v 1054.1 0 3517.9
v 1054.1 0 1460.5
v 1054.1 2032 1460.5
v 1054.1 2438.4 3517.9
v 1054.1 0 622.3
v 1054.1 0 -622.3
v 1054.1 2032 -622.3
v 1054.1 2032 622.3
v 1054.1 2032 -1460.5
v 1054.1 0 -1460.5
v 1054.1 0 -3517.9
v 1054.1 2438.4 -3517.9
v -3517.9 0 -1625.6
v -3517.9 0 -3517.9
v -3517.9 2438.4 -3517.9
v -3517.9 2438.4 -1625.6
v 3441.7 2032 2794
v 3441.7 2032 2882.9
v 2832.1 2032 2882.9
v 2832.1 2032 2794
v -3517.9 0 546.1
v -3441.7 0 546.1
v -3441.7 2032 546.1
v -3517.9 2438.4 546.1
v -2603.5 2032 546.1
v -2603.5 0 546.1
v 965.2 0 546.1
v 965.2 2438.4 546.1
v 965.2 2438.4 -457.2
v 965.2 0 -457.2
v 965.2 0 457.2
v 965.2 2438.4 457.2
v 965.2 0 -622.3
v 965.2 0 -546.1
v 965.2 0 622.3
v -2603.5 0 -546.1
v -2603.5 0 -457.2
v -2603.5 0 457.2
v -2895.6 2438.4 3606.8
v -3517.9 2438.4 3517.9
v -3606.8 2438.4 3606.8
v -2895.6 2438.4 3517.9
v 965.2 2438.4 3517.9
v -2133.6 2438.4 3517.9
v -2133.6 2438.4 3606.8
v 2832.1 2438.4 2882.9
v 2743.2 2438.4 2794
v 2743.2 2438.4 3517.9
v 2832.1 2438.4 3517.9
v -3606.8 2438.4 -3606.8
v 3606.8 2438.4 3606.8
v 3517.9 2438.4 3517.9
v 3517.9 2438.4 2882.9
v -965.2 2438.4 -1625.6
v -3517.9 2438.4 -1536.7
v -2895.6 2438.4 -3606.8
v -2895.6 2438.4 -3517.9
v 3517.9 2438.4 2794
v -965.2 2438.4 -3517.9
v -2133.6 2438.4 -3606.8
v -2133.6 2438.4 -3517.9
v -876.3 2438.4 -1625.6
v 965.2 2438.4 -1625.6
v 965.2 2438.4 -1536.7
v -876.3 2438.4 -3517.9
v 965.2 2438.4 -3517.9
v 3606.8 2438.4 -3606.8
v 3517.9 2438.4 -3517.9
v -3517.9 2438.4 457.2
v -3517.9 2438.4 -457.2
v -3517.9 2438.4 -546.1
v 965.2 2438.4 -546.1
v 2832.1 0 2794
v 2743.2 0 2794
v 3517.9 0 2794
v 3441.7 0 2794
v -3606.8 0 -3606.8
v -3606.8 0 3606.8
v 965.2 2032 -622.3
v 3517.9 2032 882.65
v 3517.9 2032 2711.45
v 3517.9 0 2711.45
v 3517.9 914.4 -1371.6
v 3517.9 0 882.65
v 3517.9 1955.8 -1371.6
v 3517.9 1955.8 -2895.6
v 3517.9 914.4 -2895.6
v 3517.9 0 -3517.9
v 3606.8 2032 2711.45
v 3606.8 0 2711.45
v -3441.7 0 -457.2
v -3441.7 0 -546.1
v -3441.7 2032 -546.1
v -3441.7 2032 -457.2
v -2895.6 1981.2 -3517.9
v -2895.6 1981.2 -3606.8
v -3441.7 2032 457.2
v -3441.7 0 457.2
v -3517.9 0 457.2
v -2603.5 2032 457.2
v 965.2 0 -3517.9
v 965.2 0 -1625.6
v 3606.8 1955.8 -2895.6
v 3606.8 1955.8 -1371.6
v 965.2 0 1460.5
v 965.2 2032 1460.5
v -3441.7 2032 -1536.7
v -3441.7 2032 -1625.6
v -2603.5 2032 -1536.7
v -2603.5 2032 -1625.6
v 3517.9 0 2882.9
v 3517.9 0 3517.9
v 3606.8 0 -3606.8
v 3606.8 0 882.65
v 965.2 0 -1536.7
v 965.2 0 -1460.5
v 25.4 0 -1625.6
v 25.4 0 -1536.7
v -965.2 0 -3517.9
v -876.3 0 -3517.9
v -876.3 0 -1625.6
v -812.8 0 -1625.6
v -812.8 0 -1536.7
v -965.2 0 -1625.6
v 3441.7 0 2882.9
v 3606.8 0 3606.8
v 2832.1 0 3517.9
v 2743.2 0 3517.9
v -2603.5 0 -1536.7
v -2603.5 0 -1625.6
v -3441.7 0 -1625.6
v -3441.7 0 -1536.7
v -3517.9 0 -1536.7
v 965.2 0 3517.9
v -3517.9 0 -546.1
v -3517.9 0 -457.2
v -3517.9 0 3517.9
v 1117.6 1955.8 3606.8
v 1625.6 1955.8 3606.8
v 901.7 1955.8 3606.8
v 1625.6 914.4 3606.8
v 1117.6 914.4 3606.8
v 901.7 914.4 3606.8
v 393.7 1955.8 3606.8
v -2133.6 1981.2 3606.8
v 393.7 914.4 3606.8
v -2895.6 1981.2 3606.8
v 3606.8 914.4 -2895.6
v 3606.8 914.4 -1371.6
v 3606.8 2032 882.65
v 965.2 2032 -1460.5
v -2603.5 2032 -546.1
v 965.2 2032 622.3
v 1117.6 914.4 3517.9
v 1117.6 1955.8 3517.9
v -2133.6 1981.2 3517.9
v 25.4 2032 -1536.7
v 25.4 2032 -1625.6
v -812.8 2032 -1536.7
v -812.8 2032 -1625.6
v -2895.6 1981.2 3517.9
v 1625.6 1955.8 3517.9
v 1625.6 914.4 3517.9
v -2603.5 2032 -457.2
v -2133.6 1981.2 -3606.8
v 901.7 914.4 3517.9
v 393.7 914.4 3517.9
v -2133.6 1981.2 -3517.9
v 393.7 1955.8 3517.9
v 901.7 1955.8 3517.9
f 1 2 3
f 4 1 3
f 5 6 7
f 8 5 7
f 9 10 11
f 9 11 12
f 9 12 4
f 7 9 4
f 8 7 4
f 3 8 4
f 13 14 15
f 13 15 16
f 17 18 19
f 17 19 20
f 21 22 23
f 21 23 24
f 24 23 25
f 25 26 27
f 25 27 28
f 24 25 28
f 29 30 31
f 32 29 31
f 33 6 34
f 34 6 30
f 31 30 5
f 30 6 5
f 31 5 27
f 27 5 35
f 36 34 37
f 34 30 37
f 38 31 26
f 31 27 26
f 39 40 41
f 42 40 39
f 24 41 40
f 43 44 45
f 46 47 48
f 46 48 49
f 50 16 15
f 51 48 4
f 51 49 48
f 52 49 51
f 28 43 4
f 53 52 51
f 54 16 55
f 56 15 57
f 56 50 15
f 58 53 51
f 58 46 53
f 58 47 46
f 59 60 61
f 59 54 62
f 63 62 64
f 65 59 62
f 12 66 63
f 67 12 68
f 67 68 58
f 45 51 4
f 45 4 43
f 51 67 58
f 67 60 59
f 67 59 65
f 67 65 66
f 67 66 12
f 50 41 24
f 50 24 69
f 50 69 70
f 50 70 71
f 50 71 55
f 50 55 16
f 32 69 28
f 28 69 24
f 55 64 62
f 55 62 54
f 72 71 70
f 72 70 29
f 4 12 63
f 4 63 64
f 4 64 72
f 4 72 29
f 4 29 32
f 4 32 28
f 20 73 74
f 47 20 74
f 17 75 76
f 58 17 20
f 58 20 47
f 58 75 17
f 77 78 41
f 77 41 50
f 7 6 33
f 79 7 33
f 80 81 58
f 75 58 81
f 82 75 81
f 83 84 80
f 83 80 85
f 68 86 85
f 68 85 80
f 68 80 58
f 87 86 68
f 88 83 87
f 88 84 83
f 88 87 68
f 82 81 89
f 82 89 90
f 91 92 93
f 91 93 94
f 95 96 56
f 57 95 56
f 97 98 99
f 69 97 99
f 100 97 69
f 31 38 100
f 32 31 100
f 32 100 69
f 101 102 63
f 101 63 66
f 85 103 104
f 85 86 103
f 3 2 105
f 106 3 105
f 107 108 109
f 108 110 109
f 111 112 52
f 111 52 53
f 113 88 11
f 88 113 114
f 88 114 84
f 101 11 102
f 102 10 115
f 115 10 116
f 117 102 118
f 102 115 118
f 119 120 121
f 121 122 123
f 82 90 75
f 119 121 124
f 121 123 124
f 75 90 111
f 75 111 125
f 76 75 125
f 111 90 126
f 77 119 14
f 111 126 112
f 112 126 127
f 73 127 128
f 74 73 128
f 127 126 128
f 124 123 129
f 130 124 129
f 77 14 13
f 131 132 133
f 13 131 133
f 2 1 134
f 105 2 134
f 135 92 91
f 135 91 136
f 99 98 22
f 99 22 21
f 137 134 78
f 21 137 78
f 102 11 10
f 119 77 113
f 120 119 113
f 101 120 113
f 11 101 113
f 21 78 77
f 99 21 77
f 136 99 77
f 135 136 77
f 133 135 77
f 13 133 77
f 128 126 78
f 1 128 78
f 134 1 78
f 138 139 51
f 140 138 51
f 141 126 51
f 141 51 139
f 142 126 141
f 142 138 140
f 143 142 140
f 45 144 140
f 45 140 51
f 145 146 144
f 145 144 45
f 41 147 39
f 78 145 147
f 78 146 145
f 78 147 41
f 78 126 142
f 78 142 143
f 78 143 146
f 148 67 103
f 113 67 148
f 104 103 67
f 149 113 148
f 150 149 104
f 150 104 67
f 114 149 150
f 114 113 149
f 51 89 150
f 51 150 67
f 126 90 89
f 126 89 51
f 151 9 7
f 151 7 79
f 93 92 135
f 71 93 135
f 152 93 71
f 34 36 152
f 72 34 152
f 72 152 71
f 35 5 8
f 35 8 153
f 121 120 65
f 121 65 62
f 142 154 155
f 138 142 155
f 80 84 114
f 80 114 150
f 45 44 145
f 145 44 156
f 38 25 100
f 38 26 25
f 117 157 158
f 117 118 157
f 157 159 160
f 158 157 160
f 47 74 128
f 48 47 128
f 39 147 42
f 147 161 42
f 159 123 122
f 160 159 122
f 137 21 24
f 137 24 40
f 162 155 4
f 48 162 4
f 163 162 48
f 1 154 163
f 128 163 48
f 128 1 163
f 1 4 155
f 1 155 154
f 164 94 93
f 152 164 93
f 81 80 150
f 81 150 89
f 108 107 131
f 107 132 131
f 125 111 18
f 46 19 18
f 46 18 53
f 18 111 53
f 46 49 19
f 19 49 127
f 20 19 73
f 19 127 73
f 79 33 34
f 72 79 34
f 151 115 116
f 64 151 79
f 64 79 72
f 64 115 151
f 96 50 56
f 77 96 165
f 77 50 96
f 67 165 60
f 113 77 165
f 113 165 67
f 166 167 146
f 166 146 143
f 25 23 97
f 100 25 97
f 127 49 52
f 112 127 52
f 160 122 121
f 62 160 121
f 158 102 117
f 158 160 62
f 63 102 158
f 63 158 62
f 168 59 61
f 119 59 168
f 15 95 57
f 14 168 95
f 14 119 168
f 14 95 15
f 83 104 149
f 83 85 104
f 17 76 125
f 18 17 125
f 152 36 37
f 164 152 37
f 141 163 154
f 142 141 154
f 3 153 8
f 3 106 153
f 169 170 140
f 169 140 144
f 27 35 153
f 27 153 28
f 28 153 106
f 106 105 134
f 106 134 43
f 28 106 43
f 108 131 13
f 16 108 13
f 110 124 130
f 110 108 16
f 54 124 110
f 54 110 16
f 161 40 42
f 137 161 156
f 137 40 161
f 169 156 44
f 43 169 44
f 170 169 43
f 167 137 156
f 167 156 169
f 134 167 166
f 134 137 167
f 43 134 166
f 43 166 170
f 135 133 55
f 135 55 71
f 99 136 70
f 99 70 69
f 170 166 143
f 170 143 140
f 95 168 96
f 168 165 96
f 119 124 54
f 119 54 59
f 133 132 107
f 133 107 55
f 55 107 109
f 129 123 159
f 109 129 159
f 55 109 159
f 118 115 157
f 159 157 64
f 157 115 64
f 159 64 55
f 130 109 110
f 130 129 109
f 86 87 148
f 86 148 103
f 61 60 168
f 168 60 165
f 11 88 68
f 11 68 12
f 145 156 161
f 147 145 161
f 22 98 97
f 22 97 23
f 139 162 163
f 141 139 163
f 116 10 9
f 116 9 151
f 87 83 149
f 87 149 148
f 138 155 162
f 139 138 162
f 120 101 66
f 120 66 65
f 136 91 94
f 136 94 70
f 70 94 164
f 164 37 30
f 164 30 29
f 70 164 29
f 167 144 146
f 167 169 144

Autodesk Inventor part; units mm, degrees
ref_plane "YZ Plane" through (0, 0, 0) normal (1, 0, 0) x (0, 1, 0)
ref_plane "XZ Plane" through (0, 0, 0) normal (0, 1, 0) x (-1, 0, 0)
ref_plane "XY Plane" through (0, 0, 0) normal (0, 0, 1) x (1, 0, 0)
sketch "Sketch1" plane through (0, 0, 0) normal (0, 1, 0) x (-1, 0, 0)
  line L0 (-965.2, -546.1) -> (-965.2, -457.2)
  line L1 (-965.2, 457.2) -> (-965.2, 546.1)
  line L2 (-965.2, -622.3) -> (-965.2, 622.3)
  line L3 (-1054.1, 622.3) -> (-1054.1, -622.3)
  line L4 (-1054.1, -508) -> (-1054.1, -381)
  line L5 (-965.2, -1460.5) -> (-965.2, -3517.9)
  line L6 (-1054.1, -3517.9) -> (-1054.1, -1460.5)
  line L7 (-3606.8, -3606.8) -> (-3606.8, 3606.8)
  line L8 (-965.2, 1460.5) -> (-965.2, 3517.9)
  line L9 (-965.2, 3606.8) -> (-1054.1, 3606.8)
  line L10 (-1054.1, 1460.5) -> (-965.2, 1460.5)
  line L11 (-1054.1, 3517.9) -> (-1054.1, 1460.5)
  line L12 (-3606.8, 3606.8) -> (3606.8, 3606.8)
  line L13 (2603.5, -457.2) -> (-965.2, -457.2)
  line L14 (-965.2, -546.1) -> (2603.5, -546.1)
  line L15 (2603.5, -546.1) -> (2603.5, -457.2)
  line L16 (3606.8, 3606.8) -> (3606.8, -3606.8)
  line L17 (2603.5, 457.2) -> (-965.2, 457.2)
  line L18 (-965.2, 546.1) -> (2603.5, 546.1)
  line L19 (2603.5, 546.1) -> (2603.5, 457.2)
  line L20 (3606.8, -3606.8) -> (-3606.8, -3606.8)
  line L21 (-965.2, -1625.6) -> (-965.2, -1536.7)
  line L22 (2603.5, -1536.7) -> (2603.5, -1625.6)
  line L23 (-25.4, -1625.6) -> (-965.2, -1625.6)
  line L24 (-965.2, -1536.7) -> (-25.4, -1536.7)
  line L25 (-25.4, -1536.7) -> (-25.4, -1625.6)
  line L26 (812.8, -1536.7) -> (812.8, -1625.6)
  line L27 (876.3, -1625.6) -> (965.2, -1625.6)
  line L28 (812.8, -1536.7) -> (2603.5, -1536.7)
  line L29 (2603.5, -1625.6) -> (812.8, -1625.6)
  line L30 (876.3, -3517.9) -> (876.3, -1625.6)
  line L31 (965.2, -1625.6) -> (965.2, -3517.9)
  line L32 (-3517.9, -3517.9) -> (3517.9, -3517.9)
  line L33 (3517.9, -3517.9) -> (3517.9, 3517.9)
  line L34 (3517.9, 3517.9) -> (-3517.9, 3517.9)
  line L35 (-3517.9, 3517.9) -> (-3517.9, -3517.9)
  line L36 (-2832.1, 2882.9) -> (-2832.1, 2794)
  line L37 (-3517.9, 2794) -> (-3517.9, 2882.9)
  line L38 (-2743.2, 2794) -> (-2743.2, 3517.9)
  line L39 (-2743.2, 3517.9) -> (-2832.1, 3517.9)
  line L40 (-2832.1, 3517.9) -> (-2832.1, 2794)
  line L41 (876.3, -3517.9) -> (965.2, -3517.9)
  line L42 (-965.2, -3517.9) -> (-1054.1, -3517.9)
  line L43 (-3441.7, 2794) -> (-3441.7, 2882.9)
  line L44 (-3441.7, 2794) -> (-3517.9, 2794)
  line L45 (-3517.9, 2882.9) -> (-3441.7, 2882.9)
  line L46 (-2832.1, 2794) -> (-2743.2, 2794)
  line L47 (-1054.1, -1460.5) -> (-965.2, -1460.5)
  line L48 (-1054.1, -622.3) -> (-965.2, -622.3)
  line L49 (3517.9, -1536.7) -> (3441.7, -1536.7)
  line L50 (3441.7, -1536.7) -> (3441.7, -1625.6)
  line L51 (3441.7, -1625.6) -> (3517.9, -1625.6)
  line L52 (3517.9, -1625.6) -> (3517.9, -1536.7)
  line L53 (3517.9, -546.1) -> (3441.7, -546.1)
  line L54 (3441.7, -546.1) -> (3441.7, -457.2)
  line L55 (3441.7, -457.2) -> (3517.9, -457.2)
  line L56 (3517.9, -457.2) -> (3517.9, -546.1)
  line L57 (-1054.1, 622.3) -> (-965.2, 622.3)
  line L58 (3517.9, 457.2) -> (3441.7, 457.2)
  line L59 (3441.7, 457.2) -> (3441.7, 546.1)
  line L60 (3441.7, 546.1) -> (3517.9, 546.1)
  line L61 (3517.9, 546.1) -> (3517.9, 457.2)
  point P0 (-889, -3606.8)
  point P1 (-965.2, -1625.6)
  point P2 (723.9, -3606.8)
  point P3 (-800.1, -546.1)
  point P4 (-965.2, 457.2)
  point P5 (0, 0)
  point P6 (-2832.1, 3517.9)
  point P7 (-2743.2, 3517.9)
  point P8 (965.2, -3517.9)
  point P9 (-3517.9, 2882.9)
  point P10 (-3517.9, 2794)
  point P11 (3517.9, 546.1)
  dimension "d1" = 914.4
  dimension "d7" = 1841.5
  dimension "d8" = 838.2
  dimension "d16" = 7213.6
  dimension "d17" = 7213.6
  dimension "d22" = 457.2
  dimension "d32" = 3606.8
  dimension "d33" = 88.9
  dimension "d36" = 3606.8
  dimension "d37" = 88.9
  dimension "d38" = 3568.7
  dimension "d86" = 76.2
  dimension "d87" = 723.9
  dimension "d92" = 609.6
  dimension "d106" = 76.2
  dimension "d107" = 76.2
  dimension "d110" = 838.2
  dimension "d111" = 76.2
  dimension "d112" = 838.2
  dimension "d121" = 838.2
  dimension "d123" = 63.5
  dimension "d124" = 76.2
extrude "Extrusion1" add sketch "Sketch1" along normal blind 2438.4 contours L2 L48 L3 L57 L1 L0 | L0 L13 L15 L14 | L1 L18 L19 L17 | L5 L32 L6 L47 | L24 L25 L23 L5 | L30 L27 L31 L32 | L35 L45 L43 L44 | L29 L26 L28 L22 L27 | L51 L50 L49 L33 | L34 L38 L46 L36 L40 | L53 L54 L55 L33 | L34 L8 L10 L11 | L58 L59 L60 L33 | L7 L12 L9 L16 L20
sketch "Sketch2" plane through (3606.8, 0, -3606.8) normal (0, 0, -1) x (-1, 0, 0)
  line L0 (7213.6, 2438.4) -> (0, 2438.4) projected
  line L1 (6502.4, 2438.4) -> (5740.4, 2438.4)
  line L2 (5740.4, 2438.4) -> (5740.4, 1981.2)
  line L3 (5740.4, 1981.2) -> (6502.4, 1981.2)
  line L4 (6502.4, 1981.2) -> (6502.4, 2438.4)
  line L5 (7213.6, 0) -> (7213.6, 2438.4) projected
  point P0 (3606.8, 0)
  point P1 (5740.4, 2438.4)
  dimension "d41" = 711.2
  dimension "d42" = 762
  dimension "d43" = 457.2
extrude "Extrusion2" cut sketch "Sketch2" against normal up to surface (88.9 mm away)
sketch "Sketch3" plane through (965.2, 0, 3517.9) normal (0, 0, -1) x (-1, 0, 0)
  line L0 (63.5, 1955.8) -> (571.5, 1955.8)
  line L1 (571.5, 1955.8) -> (571.5, 914.4)
  line L2 (571.5, 914.4) -> (63.5, 914.4)
  line L3 (63.5, 914.4) -> (63.5, 1955.8)
  line L4 (0, 0) -> (-88.9, 0) projected
  line L5 (0, 0) -> (0, 2438.4) projected
  point P0 (4483.1, 0)
  dimension "d48" = 1041.4
  dimension "d49" = 508
  dimension "d50" = 914.4
  dimension "d51" = 63.5
extrude "Extrusion3" cut sketch "Sketch3" against normal up to surface (88.9 mm away)
sketch "Sketch4" plane through (965.2, 0, 3517.9) normal (0, 0, -1) x (-1, 0, 0)
  line L0 (3860.8, 2438.4) -> (3098.8, 2438.4)
  line L1 (3098.8, 2438.4) -> (3098.8, 1981.2)
  line L2 (3098.8, 1981.2) -> (3860.8, 1981.2)
  line L3 (3860.8, 1981.2) -> (3860.8, 2438.4)
  line L4 (4483.1, 0) -> (4483.1, 2438.4) projected
  line L5 (0, 2438.4) -> (-88.9, 2438.4) projected
  point P0 (965.2, 0)
  point P1 (4572, 2438.4)
  dimension "d55" = 457.2
  dimension "d56" = 762
  dimension "d85" = 711.2
extrude "Extrusion4" cut sketch "Sketch4" against normal up to surface (88.9 mm away)
sketch "Sketch5" plane through (2743.2, 0, 3517.9) normal (0, 0, -1) x (-1, 0, 0)
  line L0 (1625.6, 1955.8) -> (1117.6, 1955.8)
  line L1 (1117.6, 1955.8) -> (1117.6, 914.4)
  line L2 (1117.6, 914.4) -> (1625.6, 914.4)
  line L3 (1625.6, 914.4) -> (1625.6, 1955.8)
  line L4 (1689.1, 0) -> (1689.1, 2438.4) projected
  line L5 (0, 0) -> (1689.1, 0) projected
  point P0 (2743.2, 0)
  dimension "d60" = 63.5
  dimension "d61" = 914.4
  dimension "d62" = 508
  dimension "d63" = 1041.4
extrude "Extrusion5" cut sketch "Sketch5" against normal up to surface (88.9 mm away)
sketch "Sketch6" plane through (3517.9, 0, -3517.9) normal (-1, 0, 0) x (0, 0, 1)
  line L0 (6400.8, 0) -> (6311.9, 0) projected
  line L1 (6400.8, 0) -> (4400.55, 0)
  line L2 (4400.55, 0) -> (4400.55, 2032)
  line L3 (4400.55, 2032) -> (6229.35, 2032)
  line L4 (6311.9, 0) -> (6311.9, 2438.4) projected
  line L5 (6229.35, 2032) -> (6229.35, 0)
  point P0 (3517.9, 0)
  point P1 (0, 0)
  point P2 (4572, 0)
  point P3 (7035.8, 0)
  dimension "d68" = 1828.8
  dimension "d69" = 2032
  dimension "d122" = 82.55
extrude "Extrusion6" cut sketch "Sketch6" against normal up to surface (88.9 mm away)
sketch "Sketch7" plane through (3517.9, 0, 2794) normal (-1, 0, 0) x (0, 0, 1)
  line L0 (-5689.6, 1955.8) -> (-4165.6, 1955.8)
  line L1 (-4165.6, 1955.8) -> (-4165.6, 914.4)
  line L2 (-4165.6, 914.4) -> (-5689.6, 914.4)
  line L3 (-5689.6, 914.4) -> (-5689.6, 1955.8)
  line L4 (88.9, 0) -> (0, 0) projected
  line L5 (-6311.9, 0) -> (-6311.9, 2438.4) projected
  point P0 (-2794, 0)
  point P1 (-1911.35, 0)
  dimension "d74" = 1524
  dimension "d75" = 914.4
  dimension "d76" = 622.3
  dimension "d125" = 1041.4
extrude "Extrusion7" cut sketch "Sketch7" against normal up to surface (88.9 mm away)
sketch "Sketch8" plane through (25.4, 0, -1625.6) normal (-1, 0, 0) x (0, 0, 1)
  line L0 (0, 2438.4) -> (88.9, 2438.4) projected
  line L1 (88.9, 0) -> (88.9, 2438.4) projected
  line L2 (0, 2438.4) -> (88.9, 2438.4)
  line L3 (88.9, 2438.4) -> (88.9, 2032)
  line L4 (88.9, 2032) -> (0, 2032)
  line L5 (0, 2032) -> (0, 2438.4)
  point P0 (1625.6, 0)
  dimension "d79" = 406.4
extrude "Extrusion8" add sketch "Sketch8" along normal up to surface (838.2 mm away)
sketch "Sketch9" plane through (-2603.5, 0, -1625.6) normal (-1, 0, 0) x (0, 0, 1)
  line L0 (0, 0) -> (0, 2438.4) projected
  line L1 (88.9, 0) -> (88.9, 2438.4) projected
  line L2 (0, 2032) -> (88.9, 2032)
  line L3 (88.9, 2032) -> (88.9, 2438.4)
  line L4 (88.9, 2438.4) -> (0, 2438.4)
  line L5 (0, 2438.4) -> (0, 2032)
  point P0 (1625.6, 0)
  point P1 (88.9, 2032)
  point P2 (44.45, 2032)
  dimension "d84" = 406.4
extrude "Extrusion9" add sketch "Sketch9" along normal up to surface (914.4 mm away)
sketch "Sketch10" plane through (3441.7, 0, 2794) normal (-1, 0, 0) x (0, 0, 1)
  line L0 (88.9, 0) -> (88.9, 2438.4) projected
  line L1 (0, 0) -> (0, 2438.4) projected
  line L2 (88.9, 2032) -> (0, 2032)
  line L3 (0, 2032) -> (0, 2438.4)
  line L4 (0, 2438.4) -> (88.9, 2438.4)
  line L5 (88.9, 2438.4) -> (88.9, 2032)
  point P0 (-2794, 0)
  point P1 (0, 2032)
  dimension "d94" = 406.4
extrude "Extrusion10" add sketch "Sketch10" along normal up to surface (609.6 mm away)
sketch "Sketch11" plane through (-2603.5, 0, 457.2) normal (-1, 0, 0) x (0, 0, 1)
  line L0 (88.9, 0) -> (88.9, 2438.4) projected
  line L1 (0, 0) -> (0, 2438.4) projected
  line L2 (88.9, 2032) -> (0, 2032)
  line L3 (0, 2032) -> (0, 2438.4)
  line L4 (0, 2438.4) -> (88.9, 2438.4)
  line L5 (88.9, 2438.4) -> (88.9, 2032)
  point P0 (-457.2, 0)
  point P1 (0, 2032)
  dimension "d97" = 406.4
extrude "Extrusion11" add sketch "Sketch11" along normal up to surface (914.4 mm away)
sketch "Sketch12" plane through (-2603.5, 0, -546.1) normal (-1, 0, 0) x (0, 0, 1)
  line L0 (88.9, 0) -> (88.9, 2438.4) projected
  line L1 (0, 2438.4) -> (88.9, 2438.4) projected
  line L2 (88.9, 2032) -> (0, 2032)
  line L3 (0, 2032) -> (0, 2438.4)
  line L4 (0, 2438.4) -> (88.9, 2438.4)
  line L5 (88.9, 2438.4) -> (88.9, 2032)
  point P0 (546.1, 0)
  dimension "d100" = 406.4
extrude "Extrusion12" add sketch "Sketch12" along normal up to surface (914.4 mm away)
sketch "Sketch15" plane through (1054.1, 0, 1460.5) normal (0, 0, -1) x (-1, 0, 0)
  line L0 (88.9, 0) -> (88.9, 2438.4) projected
  line L1 (0, 2438.4) -> (88.9, 2438.4) projected
  line L2 (88.9, 2032) -> (0, 2032)
  line L3 (0, 2032) -> (0, 2438.4)
  line L4 (0, 2438.4) -> (88.9, 2438.4)
  line L5 (88.9, 2438.4) -> (88.9, 2032)
  point P0 (1054.1, 0)
  dimension "d115" = 406.4
extrude "Extrusion14" add sketch "Sketch15" along normal up to surface (838.2 mm away)
sketch "Sketch16" plane through (965.2, 0, -1460.5) normal (0, 0, 1) x (1, 0, 0)
  line L0 (0, 0) -> (0, 2438.4) projected
  line L1 (88.9, 0) -> (88.9, 2438.4) projected
  line L2 (0, 2438.4) -> (88.9, 2438.4)
  line L3 (88.9, 2438.4) -> (88.9, 2032)
  line L4 (88.9, 2032) -> (0, 2032)
  line L5 (0, 2032) -> (0, 2438.4)
  point P0 (-965.2, 0)
  point P1 (88.9, 2438.4)
  point P2 (0, 2032)
  dimension "d118" = 406.4
extrude "Extrusion15" add sketch "Sketch16" along normal up to surface (838.2 mm away)
properties part number "Walls--Interior--Basement"
